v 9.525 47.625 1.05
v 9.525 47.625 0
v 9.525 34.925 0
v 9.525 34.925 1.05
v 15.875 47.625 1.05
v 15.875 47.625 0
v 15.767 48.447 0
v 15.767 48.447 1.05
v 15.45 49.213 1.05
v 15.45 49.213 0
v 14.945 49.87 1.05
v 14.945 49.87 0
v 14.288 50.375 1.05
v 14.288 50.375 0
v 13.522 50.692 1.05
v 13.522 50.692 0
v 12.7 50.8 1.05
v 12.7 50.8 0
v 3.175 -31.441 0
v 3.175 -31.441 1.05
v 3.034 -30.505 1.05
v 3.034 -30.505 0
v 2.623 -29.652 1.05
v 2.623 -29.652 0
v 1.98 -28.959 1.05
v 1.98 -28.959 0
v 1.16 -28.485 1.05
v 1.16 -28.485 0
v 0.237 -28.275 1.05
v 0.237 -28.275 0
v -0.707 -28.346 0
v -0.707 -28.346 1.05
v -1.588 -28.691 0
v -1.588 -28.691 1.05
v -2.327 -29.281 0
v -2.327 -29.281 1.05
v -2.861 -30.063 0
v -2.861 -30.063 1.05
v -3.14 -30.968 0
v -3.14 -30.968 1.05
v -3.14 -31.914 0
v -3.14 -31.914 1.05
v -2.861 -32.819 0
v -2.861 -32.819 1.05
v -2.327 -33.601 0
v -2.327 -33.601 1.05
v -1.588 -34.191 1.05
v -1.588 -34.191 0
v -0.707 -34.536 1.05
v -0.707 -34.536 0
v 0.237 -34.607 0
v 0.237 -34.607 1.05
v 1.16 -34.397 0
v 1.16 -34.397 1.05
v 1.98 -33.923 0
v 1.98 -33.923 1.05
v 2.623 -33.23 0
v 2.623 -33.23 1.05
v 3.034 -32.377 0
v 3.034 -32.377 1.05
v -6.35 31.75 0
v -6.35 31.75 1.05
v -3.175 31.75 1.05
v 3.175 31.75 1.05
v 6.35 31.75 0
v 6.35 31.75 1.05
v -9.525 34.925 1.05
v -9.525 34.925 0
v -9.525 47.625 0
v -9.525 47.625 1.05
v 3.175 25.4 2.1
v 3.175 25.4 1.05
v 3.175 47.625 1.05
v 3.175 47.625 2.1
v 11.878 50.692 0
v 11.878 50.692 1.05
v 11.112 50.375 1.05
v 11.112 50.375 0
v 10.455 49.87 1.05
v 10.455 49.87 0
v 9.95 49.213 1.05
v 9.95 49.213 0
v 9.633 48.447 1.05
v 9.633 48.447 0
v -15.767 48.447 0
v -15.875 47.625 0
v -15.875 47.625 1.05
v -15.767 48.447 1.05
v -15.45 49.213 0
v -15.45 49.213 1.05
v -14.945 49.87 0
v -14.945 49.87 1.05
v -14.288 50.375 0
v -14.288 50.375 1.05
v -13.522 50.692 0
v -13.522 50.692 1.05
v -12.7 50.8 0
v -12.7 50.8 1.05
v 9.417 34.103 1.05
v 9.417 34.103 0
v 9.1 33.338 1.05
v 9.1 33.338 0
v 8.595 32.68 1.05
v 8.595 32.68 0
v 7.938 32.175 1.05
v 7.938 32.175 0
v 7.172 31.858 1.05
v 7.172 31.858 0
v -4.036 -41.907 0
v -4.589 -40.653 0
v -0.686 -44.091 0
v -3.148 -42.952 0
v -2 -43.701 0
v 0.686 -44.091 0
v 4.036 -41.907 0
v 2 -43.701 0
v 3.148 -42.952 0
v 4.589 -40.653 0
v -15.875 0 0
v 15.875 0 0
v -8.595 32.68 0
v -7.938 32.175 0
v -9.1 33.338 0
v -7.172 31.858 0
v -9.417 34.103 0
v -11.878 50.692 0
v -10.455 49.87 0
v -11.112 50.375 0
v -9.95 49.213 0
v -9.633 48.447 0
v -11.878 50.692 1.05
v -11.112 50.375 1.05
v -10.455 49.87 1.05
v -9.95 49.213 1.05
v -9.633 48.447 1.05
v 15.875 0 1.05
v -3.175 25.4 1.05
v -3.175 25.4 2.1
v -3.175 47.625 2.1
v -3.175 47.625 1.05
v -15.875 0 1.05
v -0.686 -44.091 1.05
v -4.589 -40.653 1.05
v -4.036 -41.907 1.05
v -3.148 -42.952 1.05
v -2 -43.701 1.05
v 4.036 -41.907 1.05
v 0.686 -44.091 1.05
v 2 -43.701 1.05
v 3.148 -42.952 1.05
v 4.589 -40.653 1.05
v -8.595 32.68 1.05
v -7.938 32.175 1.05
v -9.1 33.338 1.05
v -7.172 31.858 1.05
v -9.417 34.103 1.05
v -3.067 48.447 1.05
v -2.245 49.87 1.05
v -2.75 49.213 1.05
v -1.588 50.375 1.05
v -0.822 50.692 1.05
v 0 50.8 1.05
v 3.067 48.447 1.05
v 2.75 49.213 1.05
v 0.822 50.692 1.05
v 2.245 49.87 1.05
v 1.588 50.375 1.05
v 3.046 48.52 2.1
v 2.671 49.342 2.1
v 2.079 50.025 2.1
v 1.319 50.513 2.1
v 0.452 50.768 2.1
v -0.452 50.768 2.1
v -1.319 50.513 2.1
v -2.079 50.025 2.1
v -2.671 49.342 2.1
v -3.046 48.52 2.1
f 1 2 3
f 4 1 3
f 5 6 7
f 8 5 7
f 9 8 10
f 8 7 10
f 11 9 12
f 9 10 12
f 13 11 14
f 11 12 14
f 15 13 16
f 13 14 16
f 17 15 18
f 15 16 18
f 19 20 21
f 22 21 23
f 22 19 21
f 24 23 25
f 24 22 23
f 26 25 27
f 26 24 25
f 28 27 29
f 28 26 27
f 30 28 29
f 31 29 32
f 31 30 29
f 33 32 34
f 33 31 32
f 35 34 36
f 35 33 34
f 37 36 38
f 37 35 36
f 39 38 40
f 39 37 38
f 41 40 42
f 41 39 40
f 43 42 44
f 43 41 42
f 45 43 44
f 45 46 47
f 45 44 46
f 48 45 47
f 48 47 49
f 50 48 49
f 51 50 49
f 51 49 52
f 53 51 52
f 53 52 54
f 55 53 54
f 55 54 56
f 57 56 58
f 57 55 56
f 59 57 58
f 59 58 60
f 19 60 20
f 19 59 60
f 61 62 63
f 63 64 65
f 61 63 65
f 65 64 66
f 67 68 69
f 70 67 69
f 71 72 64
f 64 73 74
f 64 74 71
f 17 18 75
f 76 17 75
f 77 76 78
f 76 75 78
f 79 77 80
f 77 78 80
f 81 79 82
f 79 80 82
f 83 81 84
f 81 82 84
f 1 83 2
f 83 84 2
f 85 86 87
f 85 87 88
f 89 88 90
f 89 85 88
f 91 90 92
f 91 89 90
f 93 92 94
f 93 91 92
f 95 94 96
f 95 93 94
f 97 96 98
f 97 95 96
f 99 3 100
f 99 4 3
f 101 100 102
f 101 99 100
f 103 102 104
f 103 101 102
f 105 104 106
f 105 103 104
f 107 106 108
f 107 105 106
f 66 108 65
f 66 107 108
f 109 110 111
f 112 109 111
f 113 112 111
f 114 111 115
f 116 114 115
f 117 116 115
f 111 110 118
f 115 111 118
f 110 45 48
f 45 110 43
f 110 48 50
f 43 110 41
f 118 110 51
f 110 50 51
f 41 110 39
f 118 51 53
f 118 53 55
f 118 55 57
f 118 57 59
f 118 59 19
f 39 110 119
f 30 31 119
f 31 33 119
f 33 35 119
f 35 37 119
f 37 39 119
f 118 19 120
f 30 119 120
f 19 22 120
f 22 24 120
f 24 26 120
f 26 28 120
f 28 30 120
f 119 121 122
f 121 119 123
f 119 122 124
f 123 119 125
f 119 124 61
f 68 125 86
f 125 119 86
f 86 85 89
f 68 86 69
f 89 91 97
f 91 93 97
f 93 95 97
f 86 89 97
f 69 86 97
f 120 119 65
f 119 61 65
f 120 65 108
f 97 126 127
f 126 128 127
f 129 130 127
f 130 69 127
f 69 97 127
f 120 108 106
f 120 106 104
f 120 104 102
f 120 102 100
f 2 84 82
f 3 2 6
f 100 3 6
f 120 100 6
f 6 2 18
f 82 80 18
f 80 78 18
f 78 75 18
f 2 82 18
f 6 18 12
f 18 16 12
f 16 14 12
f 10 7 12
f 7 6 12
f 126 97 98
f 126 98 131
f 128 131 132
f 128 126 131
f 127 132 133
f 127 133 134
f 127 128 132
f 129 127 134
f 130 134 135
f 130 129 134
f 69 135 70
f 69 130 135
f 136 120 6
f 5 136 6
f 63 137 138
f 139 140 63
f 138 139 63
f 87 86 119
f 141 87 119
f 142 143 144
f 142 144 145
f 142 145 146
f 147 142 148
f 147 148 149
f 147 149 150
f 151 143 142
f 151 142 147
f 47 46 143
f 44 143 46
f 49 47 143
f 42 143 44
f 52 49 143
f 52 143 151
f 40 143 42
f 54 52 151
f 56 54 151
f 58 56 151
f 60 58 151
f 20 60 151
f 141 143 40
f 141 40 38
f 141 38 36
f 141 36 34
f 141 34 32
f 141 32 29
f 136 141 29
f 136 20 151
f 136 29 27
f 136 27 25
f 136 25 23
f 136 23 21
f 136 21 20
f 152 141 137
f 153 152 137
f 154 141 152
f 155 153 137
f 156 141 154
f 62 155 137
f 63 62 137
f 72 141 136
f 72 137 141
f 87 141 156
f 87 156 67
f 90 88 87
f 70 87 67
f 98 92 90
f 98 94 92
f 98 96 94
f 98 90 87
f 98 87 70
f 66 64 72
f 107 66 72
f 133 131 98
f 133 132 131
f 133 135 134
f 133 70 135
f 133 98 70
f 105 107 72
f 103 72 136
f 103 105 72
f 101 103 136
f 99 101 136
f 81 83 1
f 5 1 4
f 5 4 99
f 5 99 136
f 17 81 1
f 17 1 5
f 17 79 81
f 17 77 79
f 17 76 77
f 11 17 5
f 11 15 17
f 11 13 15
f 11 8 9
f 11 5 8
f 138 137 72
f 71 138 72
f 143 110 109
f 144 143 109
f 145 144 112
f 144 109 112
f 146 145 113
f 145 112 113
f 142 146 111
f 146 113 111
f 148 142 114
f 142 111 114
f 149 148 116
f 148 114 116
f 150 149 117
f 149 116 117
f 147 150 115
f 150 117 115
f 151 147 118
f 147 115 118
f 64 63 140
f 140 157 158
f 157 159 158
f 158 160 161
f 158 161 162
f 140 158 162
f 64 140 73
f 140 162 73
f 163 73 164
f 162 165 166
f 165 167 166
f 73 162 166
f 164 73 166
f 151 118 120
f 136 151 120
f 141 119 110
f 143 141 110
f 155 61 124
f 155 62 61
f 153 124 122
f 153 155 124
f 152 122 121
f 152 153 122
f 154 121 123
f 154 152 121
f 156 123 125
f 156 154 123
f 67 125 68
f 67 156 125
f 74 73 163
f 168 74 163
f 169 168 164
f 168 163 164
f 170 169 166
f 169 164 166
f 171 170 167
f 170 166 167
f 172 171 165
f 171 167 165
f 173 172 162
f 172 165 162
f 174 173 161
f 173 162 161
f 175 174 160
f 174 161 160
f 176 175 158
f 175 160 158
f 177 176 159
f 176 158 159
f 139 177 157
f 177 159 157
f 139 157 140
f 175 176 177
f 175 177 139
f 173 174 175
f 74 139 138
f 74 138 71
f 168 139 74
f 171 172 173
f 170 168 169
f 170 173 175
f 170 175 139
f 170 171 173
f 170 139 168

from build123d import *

# Parameters (mm, degrees)
F1_DEPTH    = 1.05
F2_R        = 3.175
F3_DEPTH    = 28.1652770936
F4_T1_DEPTH = 16.925
F6_DEPTH    = 1.05
F7_DEPTH    = 6.35
F8_DEPTH    = 1.05
F9_R        = 3.175


# Not quite as in the source:
# - a fillet or chamfer that OpenCascade refuses, or shapes differently, is made with other operations: its cross-section is extruded or revolved along the edge and cut away or added


with BuildPart() as f1:
    # F0 (on Top) → F1 (new body)
    with BuildSketch(Plane.XY):
        Polygon((-15.875, 0), (15.875, 0), (15.875, 50.8), (9.525, 50.8), (9.525, 31.75), (3.175, 31.75), (3.175, 50.8), (-3.175, 50.8), (-3.175, 31.75), (-9.525, 31.75), (-9.525, 50.8), (-15.875, 50.8), align=None)
        with BuildLine():
            Line((4.5889374784, -40.6525160217), (15.875, 0))
            Line((15.875, 0), (-15.875, 0))
            Line((-15.875, 0), (-4.5889374784, -40.6525160217))
            ThreePointArc((-4.5889374784, -40.6525160217), (0, -44.1410226664), (4.5889374784, -40.6525160217))
        make_face()
    extrude(amount=F1_DEPTH)

    # F2 (on face) → F3 (cut)
    with BuildSketch(Plane.XY):
        with Locations((0, -31.4410226664)):
            Circle(F2_R)
    extrude(amount=F3_DEPTH, mode=Mode.SUBTRACT)

    # F4: fillet of radius 3.175 on 6 edges, made by hand

    # F4_s2 → F4_t1 (cut)
    with BuildSketch(Plane.XY.offset(-7.9375)):
        with BuildLine():
            ThreePointArc((15.875, 47.625), (14.9450640303, 49.8700640303), (12.7, 50.8))
            Line((12.7, 50.8), (15.875, 50.8))
            Line((15.875, 50.8), (15.875, 47.625))
        make_face()
        with BuildLine():
            ThreePointArc((12.7, 50.8), (10.4549359697, 49.8700640303), (9.525, 47.625))
            Line((9.525, 47.625), (9.525, 50.8))
            Line((9.525, 50.8), (12.7, 50.8))
        make_face()
        with BuildLine():
            ThreePointArc((3.175, 47.625), (2.2450640303, 49.8700640303), (0, 50.8))
            Line((0, 50.8), (3.175, 50.8))
            Line((3.175, 50.8), (3.175, 47.625))
        make_face()
        with BuildLine():
            ThreePointArc((0, 50.8), (-2.2450640303, 49.8700640303), (-3.175, 47.625))
            Line((-3.175, 47.625), (-3.175, 50.8))
            Line((-3.175, 50.8), (0, 50.8))
        make_face()
        with BuildLine():
            ThreePointArc((-12.7, 50.8), (-10.4549359697, 49.8700640303), (-9.525, 47.625))
            Line((-9.525, 47.625), (-9.525, 50.8))
            Line((-9.525, 50.8), (-12.7, 50.8))
        make_face()
        with BuildLine():
            ThreePointArc((-15.875, 47.625), (-14.9450640303, 49.8700640303), (-12.7, 50.8))
            Line((-12.7, 50.8), (-15.875, 50.8))
            Line((-15.875, 50.8), (-15.875, 47.625))
        make_face()
    extrude(amount=F4_T1_DEPTH, mode=Mode.SUBTRACT)

    # F5 (on face) → F6 (join)
    with BuildSketch(Plane.XY.offset(1.05)):
        with BuildLine():
            Line((-3.175, 47.625), (-3.175, 31.75))
            Line((-3.175, 31.75), (3.175, 31.75))
            Line((3.175, 31.75), (3.175, 47.625))
            ThreePointArc((3.175, 47.625), (0, 50.8), (-3.175, 47.625))
        make_face()
    extrude(amount=F6_DEPTH)

    # F7 (add): a face of the model
    f7_faces = [f1.faces().sort_by_distance(p)[0] for p in [
        (0, 31.75, 1.575),
    ]]
    extrude(f7_faces, amount=F7_DEPTH)

    # F5 (on face) → F8 (cut)
    with BuildSketch(Plane.XY.offset(1.05)):
        with BuildLine():
            Line((-3.175, 47.625), (-3.175, 31.75))
            Line((-3.175, 31.75), (3.175, 31.75))
            Line((3.175, 31.75), (3.175, 47.625))
            ThreePointArc((3.175, 47.625), (0, 50.8), (-3.175, 47.625))
        make_face()
    extrude(amount=-F8_DEPTH, mode=Mode.SUBTRACT)

    # F9
    f9_edges = [f1.edges().sort_by_distance(p)[0] for p in [
        (-9.525, 31.75, 0.525),
        (9.525, 31.75, 0.525),
    ]]
    fillet(f9_edges, radius=F9_R)


solid = f1.part
